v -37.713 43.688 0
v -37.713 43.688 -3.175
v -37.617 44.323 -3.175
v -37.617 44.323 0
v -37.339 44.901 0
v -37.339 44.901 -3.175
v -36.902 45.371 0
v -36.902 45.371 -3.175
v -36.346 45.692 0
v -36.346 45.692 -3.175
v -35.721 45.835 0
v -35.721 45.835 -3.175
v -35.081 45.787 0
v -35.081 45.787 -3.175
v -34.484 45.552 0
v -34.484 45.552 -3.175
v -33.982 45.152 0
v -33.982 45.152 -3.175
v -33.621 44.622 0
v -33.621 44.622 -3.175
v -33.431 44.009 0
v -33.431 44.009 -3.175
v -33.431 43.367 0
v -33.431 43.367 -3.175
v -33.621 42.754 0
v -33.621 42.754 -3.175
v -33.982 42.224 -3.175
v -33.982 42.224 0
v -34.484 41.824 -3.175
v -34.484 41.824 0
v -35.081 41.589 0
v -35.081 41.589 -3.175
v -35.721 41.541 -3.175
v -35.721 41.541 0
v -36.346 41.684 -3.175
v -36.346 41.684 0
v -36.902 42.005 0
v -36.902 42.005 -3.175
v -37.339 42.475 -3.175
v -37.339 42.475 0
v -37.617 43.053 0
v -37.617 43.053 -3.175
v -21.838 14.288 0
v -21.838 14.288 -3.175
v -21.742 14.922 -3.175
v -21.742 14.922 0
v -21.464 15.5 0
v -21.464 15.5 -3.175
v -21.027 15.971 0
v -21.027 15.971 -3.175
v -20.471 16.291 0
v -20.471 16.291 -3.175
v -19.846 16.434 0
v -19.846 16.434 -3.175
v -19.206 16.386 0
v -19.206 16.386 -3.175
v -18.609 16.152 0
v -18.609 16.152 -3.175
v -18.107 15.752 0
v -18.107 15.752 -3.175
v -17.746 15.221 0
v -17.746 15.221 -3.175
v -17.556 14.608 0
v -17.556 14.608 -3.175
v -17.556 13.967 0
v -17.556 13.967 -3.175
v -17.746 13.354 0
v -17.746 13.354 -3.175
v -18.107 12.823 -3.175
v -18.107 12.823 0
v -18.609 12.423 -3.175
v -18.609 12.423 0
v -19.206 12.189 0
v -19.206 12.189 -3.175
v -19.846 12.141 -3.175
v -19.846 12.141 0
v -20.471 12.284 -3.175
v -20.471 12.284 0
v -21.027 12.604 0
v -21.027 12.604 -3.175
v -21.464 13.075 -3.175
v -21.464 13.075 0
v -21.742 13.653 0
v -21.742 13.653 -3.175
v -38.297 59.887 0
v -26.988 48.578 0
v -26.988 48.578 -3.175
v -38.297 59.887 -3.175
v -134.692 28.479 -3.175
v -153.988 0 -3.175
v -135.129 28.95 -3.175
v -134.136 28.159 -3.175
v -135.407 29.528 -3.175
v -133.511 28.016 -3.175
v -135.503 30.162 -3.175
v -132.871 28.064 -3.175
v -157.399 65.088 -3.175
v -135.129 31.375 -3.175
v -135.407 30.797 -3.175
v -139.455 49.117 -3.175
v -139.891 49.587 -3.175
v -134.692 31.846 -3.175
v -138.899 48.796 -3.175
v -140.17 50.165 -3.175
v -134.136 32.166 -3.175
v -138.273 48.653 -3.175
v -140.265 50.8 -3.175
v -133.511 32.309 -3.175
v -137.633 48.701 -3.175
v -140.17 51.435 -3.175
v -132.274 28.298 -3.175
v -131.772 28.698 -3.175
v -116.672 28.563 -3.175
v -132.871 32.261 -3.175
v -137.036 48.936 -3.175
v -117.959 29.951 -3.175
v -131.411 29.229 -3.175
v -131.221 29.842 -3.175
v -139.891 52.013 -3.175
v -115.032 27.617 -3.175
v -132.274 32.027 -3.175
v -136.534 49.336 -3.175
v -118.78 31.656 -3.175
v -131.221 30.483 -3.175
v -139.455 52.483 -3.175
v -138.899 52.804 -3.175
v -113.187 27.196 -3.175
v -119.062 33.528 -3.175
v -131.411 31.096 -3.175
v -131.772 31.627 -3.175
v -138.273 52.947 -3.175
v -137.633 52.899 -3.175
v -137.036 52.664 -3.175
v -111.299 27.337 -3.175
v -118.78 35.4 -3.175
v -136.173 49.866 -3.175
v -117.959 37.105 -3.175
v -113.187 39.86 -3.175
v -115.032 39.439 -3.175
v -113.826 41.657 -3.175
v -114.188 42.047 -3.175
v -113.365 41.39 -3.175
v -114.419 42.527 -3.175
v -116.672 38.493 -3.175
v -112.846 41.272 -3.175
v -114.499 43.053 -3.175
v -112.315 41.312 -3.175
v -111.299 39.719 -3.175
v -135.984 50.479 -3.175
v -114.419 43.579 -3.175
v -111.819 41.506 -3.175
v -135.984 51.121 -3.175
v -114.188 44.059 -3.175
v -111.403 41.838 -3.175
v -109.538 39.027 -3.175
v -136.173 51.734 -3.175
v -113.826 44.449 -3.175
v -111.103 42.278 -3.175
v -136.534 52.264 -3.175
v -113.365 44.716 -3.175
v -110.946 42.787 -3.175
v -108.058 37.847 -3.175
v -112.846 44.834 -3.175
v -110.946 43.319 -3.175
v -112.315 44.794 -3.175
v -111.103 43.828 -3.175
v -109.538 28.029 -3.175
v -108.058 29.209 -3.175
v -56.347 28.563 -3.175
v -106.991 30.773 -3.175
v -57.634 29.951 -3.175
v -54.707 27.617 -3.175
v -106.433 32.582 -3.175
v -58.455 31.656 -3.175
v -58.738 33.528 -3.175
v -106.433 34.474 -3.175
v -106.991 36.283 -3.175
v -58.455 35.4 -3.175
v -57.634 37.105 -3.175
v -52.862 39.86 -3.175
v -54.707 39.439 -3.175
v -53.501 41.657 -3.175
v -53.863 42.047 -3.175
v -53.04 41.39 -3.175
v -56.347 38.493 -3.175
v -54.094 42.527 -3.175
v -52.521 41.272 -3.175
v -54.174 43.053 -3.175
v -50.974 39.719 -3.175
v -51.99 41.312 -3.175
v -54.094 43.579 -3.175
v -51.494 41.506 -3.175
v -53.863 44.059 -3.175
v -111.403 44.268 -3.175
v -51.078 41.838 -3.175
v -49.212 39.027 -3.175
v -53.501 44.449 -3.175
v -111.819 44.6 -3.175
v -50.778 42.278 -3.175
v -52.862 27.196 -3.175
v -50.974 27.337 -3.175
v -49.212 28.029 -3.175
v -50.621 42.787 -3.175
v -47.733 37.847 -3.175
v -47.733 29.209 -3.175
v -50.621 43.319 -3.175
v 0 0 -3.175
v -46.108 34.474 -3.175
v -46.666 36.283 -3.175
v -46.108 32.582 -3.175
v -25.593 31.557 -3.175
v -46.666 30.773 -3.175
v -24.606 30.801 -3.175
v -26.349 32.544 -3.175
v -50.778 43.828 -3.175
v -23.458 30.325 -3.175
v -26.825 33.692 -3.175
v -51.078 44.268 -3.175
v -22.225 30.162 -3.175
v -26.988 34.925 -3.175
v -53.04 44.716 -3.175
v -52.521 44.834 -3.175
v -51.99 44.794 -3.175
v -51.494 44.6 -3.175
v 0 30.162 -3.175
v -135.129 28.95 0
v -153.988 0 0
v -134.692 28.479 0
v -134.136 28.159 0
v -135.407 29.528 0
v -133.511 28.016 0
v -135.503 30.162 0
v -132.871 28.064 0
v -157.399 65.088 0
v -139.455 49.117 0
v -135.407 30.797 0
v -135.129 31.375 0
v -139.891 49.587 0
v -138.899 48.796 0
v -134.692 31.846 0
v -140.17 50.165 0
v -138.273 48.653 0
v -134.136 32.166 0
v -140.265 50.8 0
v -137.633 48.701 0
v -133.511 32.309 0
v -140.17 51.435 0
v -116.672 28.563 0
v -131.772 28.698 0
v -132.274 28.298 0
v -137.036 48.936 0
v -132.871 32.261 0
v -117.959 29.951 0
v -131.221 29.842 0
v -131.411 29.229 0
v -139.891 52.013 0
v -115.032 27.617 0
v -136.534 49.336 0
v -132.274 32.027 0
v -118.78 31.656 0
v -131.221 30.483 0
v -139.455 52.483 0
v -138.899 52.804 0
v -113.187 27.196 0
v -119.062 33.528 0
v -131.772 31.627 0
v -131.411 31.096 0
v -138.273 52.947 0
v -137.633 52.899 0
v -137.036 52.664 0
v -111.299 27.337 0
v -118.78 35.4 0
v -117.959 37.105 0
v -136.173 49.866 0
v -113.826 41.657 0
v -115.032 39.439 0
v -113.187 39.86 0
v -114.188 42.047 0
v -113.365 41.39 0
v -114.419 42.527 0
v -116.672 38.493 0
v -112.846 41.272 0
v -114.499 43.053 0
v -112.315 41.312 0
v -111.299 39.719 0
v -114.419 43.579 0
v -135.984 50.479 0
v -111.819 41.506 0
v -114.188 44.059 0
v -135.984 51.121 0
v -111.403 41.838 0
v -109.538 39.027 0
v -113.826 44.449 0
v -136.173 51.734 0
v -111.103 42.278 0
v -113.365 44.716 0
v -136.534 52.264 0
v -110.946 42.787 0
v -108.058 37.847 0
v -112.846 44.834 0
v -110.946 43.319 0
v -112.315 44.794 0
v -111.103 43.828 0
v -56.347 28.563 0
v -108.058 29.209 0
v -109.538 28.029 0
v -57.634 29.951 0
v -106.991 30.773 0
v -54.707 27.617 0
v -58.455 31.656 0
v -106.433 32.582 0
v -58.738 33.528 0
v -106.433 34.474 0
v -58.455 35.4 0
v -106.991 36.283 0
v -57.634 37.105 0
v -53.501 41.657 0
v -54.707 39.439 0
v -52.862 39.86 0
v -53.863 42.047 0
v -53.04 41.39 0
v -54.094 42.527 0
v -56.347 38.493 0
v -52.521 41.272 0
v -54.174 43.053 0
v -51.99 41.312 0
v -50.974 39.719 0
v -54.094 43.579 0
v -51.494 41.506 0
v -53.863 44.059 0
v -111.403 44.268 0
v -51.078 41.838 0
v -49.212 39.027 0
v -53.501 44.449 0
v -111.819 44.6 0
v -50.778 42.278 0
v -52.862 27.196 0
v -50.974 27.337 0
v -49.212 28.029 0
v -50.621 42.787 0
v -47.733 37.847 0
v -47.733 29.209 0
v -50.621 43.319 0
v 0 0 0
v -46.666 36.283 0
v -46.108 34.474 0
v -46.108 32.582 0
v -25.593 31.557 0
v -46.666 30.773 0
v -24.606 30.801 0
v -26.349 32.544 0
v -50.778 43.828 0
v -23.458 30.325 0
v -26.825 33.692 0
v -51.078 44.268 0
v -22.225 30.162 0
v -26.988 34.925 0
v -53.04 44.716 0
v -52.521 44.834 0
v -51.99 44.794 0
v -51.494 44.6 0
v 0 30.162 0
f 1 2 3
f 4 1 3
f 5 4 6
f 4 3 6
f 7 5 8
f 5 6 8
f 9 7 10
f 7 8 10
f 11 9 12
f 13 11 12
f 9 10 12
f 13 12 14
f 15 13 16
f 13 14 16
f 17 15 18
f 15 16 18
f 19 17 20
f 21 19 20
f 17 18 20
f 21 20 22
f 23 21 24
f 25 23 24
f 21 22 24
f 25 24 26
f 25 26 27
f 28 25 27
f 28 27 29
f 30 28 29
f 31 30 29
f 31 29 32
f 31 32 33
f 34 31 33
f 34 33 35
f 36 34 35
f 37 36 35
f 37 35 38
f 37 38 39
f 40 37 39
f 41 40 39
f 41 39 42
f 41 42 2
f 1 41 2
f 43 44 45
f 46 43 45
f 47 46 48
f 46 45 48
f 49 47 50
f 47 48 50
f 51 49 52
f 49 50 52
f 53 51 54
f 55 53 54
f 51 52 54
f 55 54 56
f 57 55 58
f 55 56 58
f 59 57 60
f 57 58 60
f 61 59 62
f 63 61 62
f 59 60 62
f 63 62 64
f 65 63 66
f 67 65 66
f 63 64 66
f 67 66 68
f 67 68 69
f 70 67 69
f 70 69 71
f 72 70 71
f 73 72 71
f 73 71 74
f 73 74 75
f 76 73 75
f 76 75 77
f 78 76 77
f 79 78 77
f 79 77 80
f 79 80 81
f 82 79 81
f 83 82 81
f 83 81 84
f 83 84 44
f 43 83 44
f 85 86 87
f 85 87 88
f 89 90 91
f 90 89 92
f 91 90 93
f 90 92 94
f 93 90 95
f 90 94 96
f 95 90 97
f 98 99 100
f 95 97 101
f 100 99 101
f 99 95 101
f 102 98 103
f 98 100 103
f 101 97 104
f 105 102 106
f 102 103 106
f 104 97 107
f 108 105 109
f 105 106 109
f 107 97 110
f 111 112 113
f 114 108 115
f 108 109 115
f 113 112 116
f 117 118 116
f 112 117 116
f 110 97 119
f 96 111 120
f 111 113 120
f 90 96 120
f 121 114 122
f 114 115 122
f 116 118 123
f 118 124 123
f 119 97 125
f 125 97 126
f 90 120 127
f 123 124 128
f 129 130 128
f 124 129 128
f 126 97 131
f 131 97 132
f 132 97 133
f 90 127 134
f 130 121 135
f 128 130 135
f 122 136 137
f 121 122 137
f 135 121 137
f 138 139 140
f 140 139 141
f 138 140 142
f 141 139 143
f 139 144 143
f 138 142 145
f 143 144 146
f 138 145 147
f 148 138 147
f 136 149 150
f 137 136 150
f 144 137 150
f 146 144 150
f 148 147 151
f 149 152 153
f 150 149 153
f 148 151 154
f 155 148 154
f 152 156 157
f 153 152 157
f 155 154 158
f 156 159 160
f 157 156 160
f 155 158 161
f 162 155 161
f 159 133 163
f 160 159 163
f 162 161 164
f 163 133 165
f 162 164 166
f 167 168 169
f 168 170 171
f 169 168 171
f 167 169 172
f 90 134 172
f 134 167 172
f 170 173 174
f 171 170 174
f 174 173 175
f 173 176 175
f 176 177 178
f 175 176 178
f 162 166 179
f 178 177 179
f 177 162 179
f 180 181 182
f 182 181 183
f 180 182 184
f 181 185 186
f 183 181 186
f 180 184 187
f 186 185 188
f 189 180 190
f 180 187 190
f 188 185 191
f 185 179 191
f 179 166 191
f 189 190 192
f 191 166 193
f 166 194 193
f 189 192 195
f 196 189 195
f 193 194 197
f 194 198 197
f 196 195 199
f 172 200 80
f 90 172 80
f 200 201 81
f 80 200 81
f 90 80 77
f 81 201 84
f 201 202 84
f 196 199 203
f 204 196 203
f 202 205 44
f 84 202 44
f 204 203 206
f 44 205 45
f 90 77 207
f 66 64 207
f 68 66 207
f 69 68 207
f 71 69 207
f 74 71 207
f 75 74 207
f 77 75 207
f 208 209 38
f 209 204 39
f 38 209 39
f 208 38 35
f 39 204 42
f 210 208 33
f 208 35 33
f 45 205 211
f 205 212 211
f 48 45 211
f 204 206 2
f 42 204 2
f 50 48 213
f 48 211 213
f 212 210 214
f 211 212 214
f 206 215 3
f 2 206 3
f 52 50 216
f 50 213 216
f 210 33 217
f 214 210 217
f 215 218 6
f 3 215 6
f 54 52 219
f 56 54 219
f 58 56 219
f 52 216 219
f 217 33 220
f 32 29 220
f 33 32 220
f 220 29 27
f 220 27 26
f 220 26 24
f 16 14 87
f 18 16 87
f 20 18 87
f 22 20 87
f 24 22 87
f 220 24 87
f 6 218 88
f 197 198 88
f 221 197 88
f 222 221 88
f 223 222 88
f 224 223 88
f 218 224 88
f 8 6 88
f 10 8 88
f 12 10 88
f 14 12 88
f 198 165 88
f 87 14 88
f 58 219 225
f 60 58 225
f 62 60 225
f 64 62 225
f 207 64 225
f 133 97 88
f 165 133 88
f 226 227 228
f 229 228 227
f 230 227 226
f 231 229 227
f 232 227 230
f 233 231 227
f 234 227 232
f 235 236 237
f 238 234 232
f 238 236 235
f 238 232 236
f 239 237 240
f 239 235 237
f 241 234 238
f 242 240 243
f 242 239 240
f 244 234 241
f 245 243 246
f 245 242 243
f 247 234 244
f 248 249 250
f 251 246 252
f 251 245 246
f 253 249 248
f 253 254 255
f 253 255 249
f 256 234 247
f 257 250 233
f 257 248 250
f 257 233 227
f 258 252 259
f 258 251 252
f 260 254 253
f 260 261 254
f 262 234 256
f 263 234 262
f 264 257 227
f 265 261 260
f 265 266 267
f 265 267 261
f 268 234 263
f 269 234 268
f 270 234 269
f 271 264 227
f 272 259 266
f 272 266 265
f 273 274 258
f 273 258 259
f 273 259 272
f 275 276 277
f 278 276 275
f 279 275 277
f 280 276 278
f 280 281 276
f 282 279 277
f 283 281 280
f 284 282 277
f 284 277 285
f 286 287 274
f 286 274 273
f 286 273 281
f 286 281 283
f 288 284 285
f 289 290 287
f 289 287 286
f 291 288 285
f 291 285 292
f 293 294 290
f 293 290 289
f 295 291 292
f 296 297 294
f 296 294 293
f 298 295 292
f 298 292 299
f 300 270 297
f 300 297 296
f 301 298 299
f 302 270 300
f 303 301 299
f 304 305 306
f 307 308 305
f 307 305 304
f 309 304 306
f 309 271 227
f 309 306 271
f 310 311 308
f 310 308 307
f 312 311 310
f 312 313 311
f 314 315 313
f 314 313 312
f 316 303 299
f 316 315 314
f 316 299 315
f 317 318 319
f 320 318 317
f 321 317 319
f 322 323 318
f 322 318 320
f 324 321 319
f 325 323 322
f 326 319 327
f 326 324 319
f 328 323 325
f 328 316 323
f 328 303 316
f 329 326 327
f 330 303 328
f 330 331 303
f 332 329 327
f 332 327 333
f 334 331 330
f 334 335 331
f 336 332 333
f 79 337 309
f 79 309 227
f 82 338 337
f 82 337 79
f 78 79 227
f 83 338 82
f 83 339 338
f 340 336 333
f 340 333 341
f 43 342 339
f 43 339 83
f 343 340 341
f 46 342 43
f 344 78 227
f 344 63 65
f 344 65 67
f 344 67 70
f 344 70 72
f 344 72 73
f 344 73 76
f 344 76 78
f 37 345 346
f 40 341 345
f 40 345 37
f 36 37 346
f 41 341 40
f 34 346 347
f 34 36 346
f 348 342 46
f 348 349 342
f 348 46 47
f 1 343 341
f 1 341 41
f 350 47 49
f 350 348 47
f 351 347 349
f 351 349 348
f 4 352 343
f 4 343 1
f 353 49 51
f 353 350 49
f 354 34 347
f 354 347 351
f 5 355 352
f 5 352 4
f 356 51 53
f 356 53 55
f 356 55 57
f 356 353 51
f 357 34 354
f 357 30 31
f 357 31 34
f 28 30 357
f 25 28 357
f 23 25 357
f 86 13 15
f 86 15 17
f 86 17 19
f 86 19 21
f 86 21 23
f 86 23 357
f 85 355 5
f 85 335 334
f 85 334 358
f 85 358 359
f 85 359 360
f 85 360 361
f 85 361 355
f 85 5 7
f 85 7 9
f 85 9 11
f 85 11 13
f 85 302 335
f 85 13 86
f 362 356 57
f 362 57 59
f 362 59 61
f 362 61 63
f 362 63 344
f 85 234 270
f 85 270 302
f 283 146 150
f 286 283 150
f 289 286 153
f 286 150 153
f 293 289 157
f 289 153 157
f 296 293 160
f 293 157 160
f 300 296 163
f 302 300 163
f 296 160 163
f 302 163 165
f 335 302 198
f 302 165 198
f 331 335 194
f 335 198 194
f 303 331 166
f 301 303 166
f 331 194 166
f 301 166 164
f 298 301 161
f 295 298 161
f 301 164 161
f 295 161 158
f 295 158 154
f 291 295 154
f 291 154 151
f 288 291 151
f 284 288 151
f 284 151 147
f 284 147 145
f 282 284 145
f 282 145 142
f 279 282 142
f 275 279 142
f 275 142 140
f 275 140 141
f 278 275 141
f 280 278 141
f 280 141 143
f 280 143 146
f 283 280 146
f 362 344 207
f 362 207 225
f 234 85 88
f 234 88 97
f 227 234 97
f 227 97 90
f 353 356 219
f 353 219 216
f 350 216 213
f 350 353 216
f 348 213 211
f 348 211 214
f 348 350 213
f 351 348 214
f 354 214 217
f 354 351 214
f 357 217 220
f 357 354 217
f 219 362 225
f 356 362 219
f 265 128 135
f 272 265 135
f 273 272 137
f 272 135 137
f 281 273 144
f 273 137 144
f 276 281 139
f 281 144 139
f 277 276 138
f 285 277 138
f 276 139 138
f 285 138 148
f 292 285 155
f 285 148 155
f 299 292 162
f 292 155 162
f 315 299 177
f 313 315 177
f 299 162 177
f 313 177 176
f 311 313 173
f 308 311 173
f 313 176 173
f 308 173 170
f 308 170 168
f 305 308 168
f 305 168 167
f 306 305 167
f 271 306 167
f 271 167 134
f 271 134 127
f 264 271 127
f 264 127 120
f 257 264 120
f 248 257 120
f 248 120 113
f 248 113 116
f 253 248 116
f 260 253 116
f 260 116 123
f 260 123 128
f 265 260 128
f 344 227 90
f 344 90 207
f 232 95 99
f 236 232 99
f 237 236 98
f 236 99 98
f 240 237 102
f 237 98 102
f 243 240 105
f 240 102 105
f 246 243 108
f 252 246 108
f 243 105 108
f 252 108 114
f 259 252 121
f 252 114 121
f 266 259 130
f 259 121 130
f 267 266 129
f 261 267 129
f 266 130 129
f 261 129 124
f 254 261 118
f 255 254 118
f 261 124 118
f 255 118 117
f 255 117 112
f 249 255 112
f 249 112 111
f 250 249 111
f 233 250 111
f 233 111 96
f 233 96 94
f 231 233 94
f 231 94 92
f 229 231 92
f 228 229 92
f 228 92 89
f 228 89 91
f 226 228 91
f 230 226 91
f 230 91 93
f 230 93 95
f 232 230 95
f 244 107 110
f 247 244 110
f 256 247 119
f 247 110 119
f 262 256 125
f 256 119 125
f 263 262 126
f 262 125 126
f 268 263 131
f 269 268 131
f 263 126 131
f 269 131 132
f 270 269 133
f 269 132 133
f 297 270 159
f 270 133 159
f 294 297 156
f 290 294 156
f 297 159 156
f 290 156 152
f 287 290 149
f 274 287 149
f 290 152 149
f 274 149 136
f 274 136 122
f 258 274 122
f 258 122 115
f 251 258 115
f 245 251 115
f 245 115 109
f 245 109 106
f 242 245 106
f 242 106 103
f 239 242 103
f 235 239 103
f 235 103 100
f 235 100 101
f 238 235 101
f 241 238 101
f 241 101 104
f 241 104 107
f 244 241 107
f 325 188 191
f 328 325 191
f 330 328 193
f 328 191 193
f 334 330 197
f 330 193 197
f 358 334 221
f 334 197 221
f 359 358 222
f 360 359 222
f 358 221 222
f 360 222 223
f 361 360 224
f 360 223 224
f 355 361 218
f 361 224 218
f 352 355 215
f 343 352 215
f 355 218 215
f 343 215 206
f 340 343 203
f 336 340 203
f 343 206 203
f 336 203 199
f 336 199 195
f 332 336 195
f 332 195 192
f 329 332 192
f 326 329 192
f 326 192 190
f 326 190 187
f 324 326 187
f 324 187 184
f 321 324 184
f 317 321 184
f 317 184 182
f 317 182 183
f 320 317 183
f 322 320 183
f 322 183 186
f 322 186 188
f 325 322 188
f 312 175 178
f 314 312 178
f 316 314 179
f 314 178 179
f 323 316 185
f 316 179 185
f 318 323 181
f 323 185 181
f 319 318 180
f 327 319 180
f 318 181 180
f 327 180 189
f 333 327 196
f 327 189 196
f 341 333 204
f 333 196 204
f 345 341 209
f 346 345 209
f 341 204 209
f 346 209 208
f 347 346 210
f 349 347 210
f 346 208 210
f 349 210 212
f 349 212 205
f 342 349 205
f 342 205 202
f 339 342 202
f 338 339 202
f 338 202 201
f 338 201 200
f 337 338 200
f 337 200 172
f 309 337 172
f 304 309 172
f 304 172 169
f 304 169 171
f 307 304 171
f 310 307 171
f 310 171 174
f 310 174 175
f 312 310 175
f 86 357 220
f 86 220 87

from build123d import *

# Parameters (mm, degrees)
BOSS_EXTRUDE1_DEPTH             = 3.175
F_1_2_0_5_DIAMETER_HOLE1_D      = 12.7
F_9_64_0_14063_DIAMETER_HOLE1_D = 3.572002
F_6_CLEARANCE_HOLE1_D           = 4.3053
F_6_CLEARANCE_HOLE2_D           = 4.3053


with BuildPart() as part:
    # Sketch1 → Boss-Extrude1 (new body)
    with BuildSketch(Plane.XY):
        with BuildLine():
            Line((-26.9875, 34.925), (-26.9875, 48.5775))
            Line((-26.9875, 48.5775), (-38.29743402, 59.88743402))
            Line((-38.29743402, 59.88743402), (-157.398586801, 65.087510963))
            Line((-157.398586801, 65.087510963), (-153.9875, 1.0725e-05))
            Line((-153.9875, 1.0725e-05), (0, 0))
            Line((0, 0), (0, 30.1625))
            Line((0, 30.1625), (-22.225, 30.1625))
            ThreePointArc((-22.225, 30.1625), (-25.592596045, 31.557403955), (-26.9875, 34.925))
        make_face()
    extrude(amount=-BOSS_EXTRUDE1_DEPTH)

    # 1/2 (0.5) Diameter Hole1 (through all)
    with Locations(Plane.XY):
        with Locations((-112.7125, 33.528), (-52.3875, 33.528)):
            Hole(F_1_2_0_5_DIAMETER_HOLE1_D / 2)

    # 9/64 (0.14063) Diameter Hole1 (through all)
    with Locations(Plane.XY):
        with Locations((-112.7125, 43.053), (-52.3875, 43.053)):
            Hole(F_9_64_0_14063_DIAMETER_HOLE1_D / 2)

    # #6 Clearance Hole1 (through all)
    with Locations(Plane.XY):
        with Locations((-133.35, 30.1625), (-35.56, 43.688)):
            Hole(F_6_CLEARANCE_HOLE1_D / 2)

    # #6 Clearance Hole2 (through all)
    with Locations(Plane.XY):
        with Locations((-138.1125, 50.8), (-19.685, 14.2875)):
            Hole(F_6_CLEARANCE_HOLE2_D / 2)


solid = part.part
